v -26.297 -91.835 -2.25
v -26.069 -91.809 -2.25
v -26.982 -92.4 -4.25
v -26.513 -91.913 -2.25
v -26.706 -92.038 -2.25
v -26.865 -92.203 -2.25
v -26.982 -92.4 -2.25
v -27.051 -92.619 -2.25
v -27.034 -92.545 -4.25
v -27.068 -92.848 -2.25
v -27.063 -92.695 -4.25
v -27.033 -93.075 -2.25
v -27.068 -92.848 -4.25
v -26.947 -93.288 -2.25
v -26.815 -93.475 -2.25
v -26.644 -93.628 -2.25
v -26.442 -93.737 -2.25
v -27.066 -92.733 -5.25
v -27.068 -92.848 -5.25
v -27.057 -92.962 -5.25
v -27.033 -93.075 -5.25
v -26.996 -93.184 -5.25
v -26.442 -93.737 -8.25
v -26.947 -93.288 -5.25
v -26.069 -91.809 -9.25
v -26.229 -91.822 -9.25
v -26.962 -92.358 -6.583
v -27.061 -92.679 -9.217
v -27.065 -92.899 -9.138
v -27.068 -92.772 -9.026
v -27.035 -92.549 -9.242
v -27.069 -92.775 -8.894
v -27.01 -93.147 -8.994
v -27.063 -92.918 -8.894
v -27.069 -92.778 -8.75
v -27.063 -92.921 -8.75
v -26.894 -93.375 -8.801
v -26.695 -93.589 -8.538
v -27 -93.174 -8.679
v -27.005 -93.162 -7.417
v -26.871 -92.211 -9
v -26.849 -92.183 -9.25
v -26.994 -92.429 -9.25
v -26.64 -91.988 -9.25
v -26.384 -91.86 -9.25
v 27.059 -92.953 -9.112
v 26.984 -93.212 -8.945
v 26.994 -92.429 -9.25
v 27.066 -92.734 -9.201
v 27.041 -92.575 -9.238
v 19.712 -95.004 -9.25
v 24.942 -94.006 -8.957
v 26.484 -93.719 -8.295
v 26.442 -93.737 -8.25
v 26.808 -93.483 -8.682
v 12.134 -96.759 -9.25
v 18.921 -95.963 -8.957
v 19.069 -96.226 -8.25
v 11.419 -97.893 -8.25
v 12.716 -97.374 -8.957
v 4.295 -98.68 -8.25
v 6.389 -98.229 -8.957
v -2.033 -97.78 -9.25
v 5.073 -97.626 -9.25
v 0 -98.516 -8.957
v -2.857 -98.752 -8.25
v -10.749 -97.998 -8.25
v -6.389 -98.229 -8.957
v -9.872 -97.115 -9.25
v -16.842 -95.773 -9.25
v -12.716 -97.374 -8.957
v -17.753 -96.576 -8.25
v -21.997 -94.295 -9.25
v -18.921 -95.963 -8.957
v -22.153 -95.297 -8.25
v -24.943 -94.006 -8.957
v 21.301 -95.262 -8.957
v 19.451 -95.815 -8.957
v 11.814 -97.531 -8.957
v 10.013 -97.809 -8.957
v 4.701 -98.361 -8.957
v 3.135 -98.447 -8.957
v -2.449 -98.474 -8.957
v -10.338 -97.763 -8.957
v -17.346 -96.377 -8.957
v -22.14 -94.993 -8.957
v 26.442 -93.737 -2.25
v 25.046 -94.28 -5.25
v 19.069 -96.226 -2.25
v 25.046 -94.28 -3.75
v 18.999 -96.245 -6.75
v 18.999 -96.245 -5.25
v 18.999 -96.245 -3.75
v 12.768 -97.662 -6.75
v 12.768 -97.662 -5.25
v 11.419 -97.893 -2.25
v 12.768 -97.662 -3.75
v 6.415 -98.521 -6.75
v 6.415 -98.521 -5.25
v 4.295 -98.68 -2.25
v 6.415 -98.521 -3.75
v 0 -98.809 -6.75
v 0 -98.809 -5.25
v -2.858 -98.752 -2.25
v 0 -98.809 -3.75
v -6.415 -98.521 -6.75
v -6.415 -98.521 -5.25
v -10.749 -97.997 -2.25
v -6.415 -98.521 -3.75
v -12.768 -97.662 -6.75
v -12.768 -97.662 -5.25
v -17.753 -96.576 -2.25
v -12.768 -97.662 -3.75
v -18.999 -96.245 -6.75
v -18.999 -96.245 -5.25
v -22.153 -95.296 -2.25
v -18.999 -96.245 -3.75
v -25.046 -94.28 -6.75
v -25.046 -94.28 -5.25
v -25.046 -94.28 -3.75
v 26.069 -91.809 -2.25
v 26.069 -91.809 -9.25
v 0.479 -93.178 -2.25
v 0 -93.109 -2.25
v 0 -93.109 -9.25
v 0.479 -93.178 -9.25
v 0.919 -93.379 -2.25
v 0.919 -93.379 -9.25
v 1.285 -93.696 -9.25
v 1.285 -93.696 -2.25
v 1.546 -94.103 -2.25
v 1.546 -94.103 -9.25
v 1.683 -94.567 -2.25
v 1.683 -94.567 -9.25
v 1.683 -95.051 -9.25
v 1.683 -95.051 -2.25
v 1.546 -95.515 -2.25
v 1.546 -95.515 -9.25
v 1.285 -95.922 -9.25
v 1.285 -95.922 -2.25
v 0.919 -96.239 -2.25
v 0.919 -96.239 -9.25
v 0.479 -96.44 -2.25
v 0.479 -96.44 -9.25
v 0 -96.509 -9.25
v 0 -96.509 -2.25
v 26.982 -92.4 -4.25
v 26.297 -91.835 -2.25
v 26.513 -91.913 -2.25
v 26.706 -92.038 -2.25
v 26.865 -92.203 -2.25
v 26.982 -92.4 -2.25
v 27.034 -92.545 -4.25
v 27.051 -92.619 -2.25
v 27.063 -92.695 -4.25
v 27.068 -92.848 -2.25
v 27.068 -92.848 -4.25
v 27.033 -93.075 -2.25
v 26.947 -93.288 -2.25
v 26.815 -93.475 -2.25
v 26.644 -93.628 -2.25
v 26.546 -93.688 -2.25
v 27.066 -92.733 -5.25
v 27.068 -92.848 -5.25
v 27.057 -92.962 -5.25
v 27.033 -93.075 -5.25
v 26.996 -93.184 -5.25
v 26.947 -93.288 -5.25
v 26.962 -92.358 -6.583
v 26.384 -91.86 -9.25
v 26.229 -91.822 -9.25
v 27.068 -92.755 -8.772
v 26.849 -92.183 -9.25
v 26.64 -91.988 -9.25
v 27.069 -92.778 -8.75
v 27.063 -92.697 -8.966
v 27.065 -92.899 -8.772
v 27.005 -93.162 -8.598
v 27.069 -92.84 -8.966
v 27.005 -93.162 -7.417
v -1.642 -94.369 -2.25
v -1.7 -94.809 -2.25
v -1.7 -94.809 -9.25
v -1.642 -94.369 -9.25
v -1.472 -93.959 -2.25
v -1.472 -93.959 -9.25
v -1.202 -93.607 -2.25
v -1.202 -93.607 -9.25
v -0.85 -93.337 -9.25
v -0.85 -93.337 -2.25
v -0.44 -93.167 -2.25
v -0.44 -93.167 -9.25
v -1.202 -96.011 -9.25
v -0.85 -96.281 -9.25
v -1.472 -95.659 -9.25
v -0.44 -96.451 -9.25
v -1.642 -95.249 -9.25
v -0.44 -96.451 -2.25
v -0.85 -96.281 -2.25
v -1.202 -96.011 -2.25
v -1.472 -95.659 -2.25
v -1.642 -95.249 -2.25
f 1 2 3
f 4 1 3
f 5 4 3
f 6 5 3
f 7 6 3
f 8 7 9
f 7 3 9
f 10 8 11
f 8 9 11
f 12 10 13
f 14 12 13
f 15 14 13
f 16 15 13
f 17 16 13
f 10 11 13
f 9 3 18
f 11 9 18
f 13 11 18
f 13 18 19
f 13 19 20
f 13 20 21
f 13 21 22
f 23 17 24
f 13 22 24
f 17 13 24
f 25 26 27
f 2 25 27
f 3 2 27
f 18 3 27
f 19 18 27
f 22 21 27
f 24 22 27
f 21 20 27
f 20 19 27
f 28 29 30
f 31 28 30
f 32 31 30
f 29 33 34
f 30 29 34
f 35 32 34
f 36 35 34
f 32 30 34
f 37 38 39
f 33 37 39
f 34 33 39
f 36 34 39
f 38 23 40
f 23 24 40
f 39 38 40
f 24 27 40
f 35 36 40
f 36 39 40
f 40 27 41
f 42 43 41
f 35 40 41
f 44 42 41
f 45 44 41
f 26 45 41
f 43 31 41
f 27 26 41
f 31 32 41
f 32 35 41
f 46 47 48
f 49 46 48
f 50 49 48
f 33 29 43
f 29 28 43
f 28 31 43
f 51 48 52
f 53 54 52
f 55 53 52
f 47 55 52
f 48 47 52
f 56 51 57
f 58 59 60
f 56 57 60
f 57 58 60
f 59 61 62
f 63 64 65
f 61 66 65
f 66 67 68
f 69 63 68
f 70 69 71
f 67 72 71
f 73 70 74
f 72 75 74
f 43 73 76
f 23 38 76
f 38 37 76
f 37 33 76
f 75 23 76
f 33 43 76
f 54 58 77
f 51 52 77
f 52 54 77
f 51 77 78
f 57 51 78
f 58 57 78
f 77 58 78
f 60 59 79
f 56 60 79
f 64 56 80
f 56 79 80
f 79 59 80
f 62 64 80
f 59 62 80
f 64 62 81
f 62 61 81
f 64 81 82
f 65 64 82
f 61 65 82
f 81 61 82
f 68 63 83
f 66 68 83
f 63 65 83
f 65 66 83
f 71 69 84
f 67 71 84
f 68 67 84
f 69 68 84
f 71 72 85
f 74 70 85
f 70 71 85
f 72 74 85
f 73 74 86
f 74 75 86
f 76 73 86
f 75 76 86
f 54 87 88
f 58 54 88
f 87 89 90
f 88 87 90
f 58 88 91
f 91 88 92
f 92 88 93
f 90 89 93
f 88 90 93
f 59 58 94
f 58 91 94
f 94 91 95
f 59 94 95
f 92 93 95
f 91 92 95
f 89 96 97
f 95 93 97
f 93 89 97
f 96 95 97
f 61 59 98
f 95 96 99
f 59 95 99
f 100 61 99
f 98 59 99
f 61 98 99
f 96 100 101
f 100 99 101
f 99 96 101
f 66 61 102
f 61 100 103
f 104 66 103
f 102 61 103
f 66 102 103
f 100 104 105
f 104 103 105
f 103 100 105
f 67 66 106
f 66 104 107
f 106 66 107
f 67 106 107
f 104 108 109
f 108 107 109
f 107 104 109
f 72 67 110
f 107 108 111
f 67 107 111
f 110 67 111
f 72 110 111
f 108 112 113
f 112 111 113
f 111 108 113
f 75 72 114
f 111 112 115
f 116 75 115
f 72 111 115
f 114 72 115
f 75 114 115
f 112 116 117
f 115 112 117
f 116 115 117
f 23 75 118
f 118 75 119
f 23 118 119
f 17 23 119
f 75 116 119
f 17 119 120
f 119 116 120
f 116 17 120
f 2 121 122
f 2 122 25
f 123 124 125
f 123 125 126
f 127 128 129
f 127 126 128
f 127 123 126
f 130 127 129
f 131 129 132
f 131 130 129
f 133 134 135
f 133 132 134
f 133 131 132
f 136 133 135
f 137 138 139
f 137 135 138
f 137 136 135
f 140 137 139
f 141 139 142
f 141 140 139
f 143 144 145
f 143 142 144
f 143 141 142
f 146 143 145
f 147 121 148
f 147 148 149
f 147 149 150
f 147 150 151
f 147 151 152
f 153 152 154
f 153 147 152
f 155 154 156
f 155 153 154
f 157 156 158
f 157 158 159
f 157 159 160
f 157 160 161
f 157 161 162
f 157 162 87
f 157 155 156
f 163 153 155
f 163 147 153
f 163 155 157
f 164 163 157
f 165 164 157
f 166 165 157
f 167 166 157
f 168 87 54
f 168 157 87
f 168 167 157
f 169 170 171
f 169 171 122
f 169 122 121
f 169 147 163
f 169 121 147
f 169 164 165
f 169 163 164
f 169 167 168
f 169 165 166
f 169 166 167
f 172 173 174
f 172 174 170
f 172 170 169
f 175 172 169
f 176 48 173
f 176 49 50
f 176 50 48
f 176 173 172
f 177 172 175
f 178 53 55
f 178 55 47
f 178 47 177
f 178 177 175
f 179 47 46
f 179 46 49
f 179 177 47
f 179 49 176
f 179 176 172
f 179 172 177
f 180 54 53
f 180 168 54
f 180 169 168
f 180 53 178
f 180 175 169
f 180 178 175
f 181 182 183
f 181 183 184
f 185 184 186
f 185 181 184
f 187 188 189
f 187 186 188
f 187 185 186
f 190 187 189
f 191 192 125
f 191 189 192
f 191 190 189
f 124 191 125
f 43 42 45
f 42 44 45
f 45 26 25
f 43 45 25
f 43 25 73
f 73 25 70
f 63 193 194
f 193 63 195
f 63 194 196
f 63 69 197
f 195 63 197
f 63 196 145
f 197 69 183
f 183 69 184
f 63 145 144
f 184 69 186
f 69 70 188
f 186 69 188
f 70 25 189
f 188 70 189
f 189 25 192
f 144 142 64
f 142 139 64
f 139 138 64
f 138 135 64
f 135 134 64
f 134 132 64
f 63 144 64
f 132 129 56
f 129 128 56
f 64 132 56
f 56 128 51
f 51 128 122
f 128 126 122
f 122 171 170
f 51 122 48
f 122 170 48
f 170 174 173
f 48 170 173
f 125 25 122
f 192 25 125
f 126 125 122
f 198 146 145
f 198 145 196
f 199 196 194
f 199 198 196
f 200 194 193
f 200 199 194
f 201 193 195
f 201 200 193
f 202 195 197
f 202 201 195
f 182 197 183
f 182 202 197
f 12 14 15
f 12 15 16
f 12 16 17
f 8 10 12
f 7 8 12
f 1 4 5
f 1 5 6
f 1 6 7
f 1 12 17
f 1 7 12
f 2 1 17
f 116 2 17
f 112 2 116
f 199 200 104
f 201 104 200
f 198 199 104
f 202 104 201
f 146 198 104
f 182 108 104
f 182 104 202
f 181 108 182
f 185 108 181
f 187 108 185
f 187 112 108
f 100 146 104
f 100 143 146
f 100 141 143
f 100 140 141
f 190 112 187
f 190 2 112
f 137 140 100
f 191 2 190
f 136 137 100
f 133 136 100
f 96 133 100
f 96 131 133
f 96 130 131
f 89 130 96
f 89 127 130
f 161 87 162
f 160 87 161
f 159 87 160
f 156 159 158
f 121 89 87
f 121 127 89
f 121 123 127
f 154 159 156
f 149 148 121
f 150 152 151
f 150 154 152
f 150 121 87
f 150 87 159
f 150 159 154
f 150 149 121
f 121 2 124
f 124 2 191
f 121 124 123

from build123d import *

# Parameters (mm, degrees)
EXTRUDE_START            = -2.25
EXTRUDE_2_OUTLINE_R      = 7.6
EXTRUDE_2_DEPTH          = 4.5
FILLET_1_R               = 20
EXTRUDE_6_DEPTH          = 7
FILLET_5_R               = 1
CUT_EXTRUDE_3_DEPTH      = 120.048972165
CUT_EXTRUDE_3_DEPTH_BACK = 120.048972165


# Read off the part's stored shape, not the designer's step: Бобышка-Вытянуть2
with BuildPart() as part:
    # Бобышка-Вытянуть2 outline → Бобышка-Вытянуть2 (new body)
    with BuildSketch(Plane.XY.offset(EXTRUDE_START)):
        with BuildLine():
            add(Edge.make_bspline(
                [(-65.4, -39.40914805), (-65.4, -47.175816893), (-62.002230156, -62.709154577), (-47.47251585, -82.482509686), (-25.700369735, -95.710351943), (0, -100.358546104), (25.700369735, -95.710351943), (47.47251585, -82.482509686), (62.002230156, -62.709154577), (67.098884922, -39.40914805), (62.002230156, -16.109141524), (47.47251585, 3.664213585), (25.700369735, 16.892055843), (0, 21.540250003), (-25.700369735, 16.892055843), (-47.47251585, 3.664213585), (-62.002230156, -16.109141524), (-65.4, -31.642479208), (-65.4, -39.40914805)],
                knots=[0, 0, 0, 0, 0.392699082, 0.785398163, 1.178097245, 1.570796327, 1.963495408, 2.35619449, 2.748893572, 3.141592654, 3.534291735, 3.926990817, 4.319689899, 4.71238898, 5.105088062, 5.497787144, 5.890486225, 6.283185307, 6.283185307, 6.283185307, 6.283185307], degree=3))
        make_face()
        with BuildLine():
            add(Edge.make_bspline(
                [(-50.377711226, -9.40914805), (-50.920216849, -10.147880044), (-53.009488643, -13.148970519), (-58.287053578, -22.675724676), (-60.4, -32.361278425), (-60.4, -39.40914805), (-60.4, -46.457017676), (-57.531501115, -59.605955028), (-48.578428032, -72.525678375), (-42.381106639, -78.200739223), (-40.925271095, -79.40914805)],
                knots=[5.694527978, 5.694527978, 5.694527978, 5.694527978, 5.74351754, 5.890486225, 6.283185307, 6.283185307, 6.283185307, 6.675884389, 7.015828772, 7.114003543, 7.114003543, 7.114003543, 7.114003543], degree=3))
            Line((-50.377711226, -9.40914805), (-12.131830741, -18.974848484))
            ThreePointArc((-12.131830741, -18.974848484), (0, -20.468986128), (12.131830741, -18.974848484))
            Line((12.131830741, -18.974848484), (50.373795788, -9.410127343))
            add(Edge.make_bspline(
                [(40.925271095, -79.40914805), (42.381106639, -78.200739223), (48.578428032, -72.525678375), (57.531501115, -59.605955028), (61.937523955, -39.40914805), (58.09524141, -21.796475187), (52.543848483, -12.36529325), (50.373795788, -9.410127343)],
                knots=[2.310774418, 2.310774418, 2.310774418, 2.310774418, 2.408949189, 2.748893572, 3.141592654, 3.534291735, 3.730251177, 3.730251177, 3.730251177, 3.730251177], degree=3))
            Line((40.925271095, -79.40914805), (-40.925271095, -79.40914805))
        make_face(mode=Mode.SUBTRACT)
        with Locations((0, -9.40914805)):
            Circle(EXTRUDE_2_OUTLINE_R, mode=Mode.SUBTRACT)
    extrude(amount=EXTRUDE_2_DEPTH)

    # Скругление1
    fillet_1_edges = [part.edges().sort_by_distance(p)[0] for p in [
        (50.373795788, -9.410127343, 0),
        (-50.377711226, -9.40914805, 0),
        (-40.925271095, -79.40914805, 0),
        (40.925271095, -79.40914805, 0),
    ]]
    fillet(fillet_1_edges, radius=FILLET_1_R)


with BuildPart() as body_2:
    # Эскиз5 → Бобышка-Вытянуть6 (new body)
    with BuildSketch(Plane(origin=(0, 0, -2.25), x_dir=(-1, 0, 0), z_dir=(0, 0, -1))):
        with BuildLine():
            Line((-30.79471813, -91.80914805), (30.79471813, -91.80914805))
            add(Edge.make_bspline(
                [(-30.79471813, -91.80914805), (-28.92410717, -92.717157206), (-19.255000826, -96.876067707), (0, -100.358546104), (19.255000826, -96.876067707), (28.92410717, -92.717157206), (30.79471813, -91.80914805)],
                knots=[4.222444596, 4.222444596, 4.222444596, 4.222444596, 4.319689899, 4.71238898, 5.105088062, 5.202333365, 5.202333365, 5.202333365, 5.202333365], degree=3))
        make_face()
    extrude(amount=EXTRUDE_6_DEPTH)

    # Скругление5
    fillet_5_edges = [body_2.edges().sort_by_distance(p)[0] for p in [
        (0, -98.80914805, -9.25),
        (30.79471813, -91.80914805, -5.75),
        (-30.79471813, -91.80914805, -5.75),
    ]]
    fillet(fillet_5_edges, radius=FILLET_5_R)


with BuildPart() as cut_extrude_3_tool:
    # Эскиз7 → Вырез-Вытянуть3 (new, two sides: drawn at the far end of the back side and taken through both)
    with BuildSketch(Plane(origin=(0, 0, -9.25), x_dir=(-1, 0, 0), z_dir=(0, 0, -1)).offset(-CUT_EXTRUDE_3_DEPTH_BACK)):
        with BuildLine():
            ThreePointArc((1.7, -94.8091481), (1.202081528, -93.607066572), (0, -93.1091481))
            Line((0, -93.1091481), (0, -96.5091481))
            ThreePointArc((0, -96.5091481), (1.202081528, -96.011229629), (1.7, -94.8091481))
        make_face()
        with BuildLine():
            Line((0, -96.5091481), (0, -93.1091481))
            ThreePointArc((0, -93.1091481), (-1.7, -94.8091481), (0, -96.5091481))
        make_face()
    extrude(amount=CUT_EXTRUDE_3_DEPTH + CUT_EXTRUDE_3_DEPTH_BACK)


with BuildPart() as part_1:
    add(part.part)

    # Вырез-Вытянуть3: cut by cut_extrude_3_tool
    add(cut_extrude_3_tool.part, mode=Mode.SUBTRACT)


with BuildPart() as body_2_1:
    add(body_2.part)

    # Вырез-Вытянуть3: cut by cut_extrude_3_tool
    add(cut_extrude_3_tool.part, mode=Mode.SUBTRACT)


solid = body_2_1.part
